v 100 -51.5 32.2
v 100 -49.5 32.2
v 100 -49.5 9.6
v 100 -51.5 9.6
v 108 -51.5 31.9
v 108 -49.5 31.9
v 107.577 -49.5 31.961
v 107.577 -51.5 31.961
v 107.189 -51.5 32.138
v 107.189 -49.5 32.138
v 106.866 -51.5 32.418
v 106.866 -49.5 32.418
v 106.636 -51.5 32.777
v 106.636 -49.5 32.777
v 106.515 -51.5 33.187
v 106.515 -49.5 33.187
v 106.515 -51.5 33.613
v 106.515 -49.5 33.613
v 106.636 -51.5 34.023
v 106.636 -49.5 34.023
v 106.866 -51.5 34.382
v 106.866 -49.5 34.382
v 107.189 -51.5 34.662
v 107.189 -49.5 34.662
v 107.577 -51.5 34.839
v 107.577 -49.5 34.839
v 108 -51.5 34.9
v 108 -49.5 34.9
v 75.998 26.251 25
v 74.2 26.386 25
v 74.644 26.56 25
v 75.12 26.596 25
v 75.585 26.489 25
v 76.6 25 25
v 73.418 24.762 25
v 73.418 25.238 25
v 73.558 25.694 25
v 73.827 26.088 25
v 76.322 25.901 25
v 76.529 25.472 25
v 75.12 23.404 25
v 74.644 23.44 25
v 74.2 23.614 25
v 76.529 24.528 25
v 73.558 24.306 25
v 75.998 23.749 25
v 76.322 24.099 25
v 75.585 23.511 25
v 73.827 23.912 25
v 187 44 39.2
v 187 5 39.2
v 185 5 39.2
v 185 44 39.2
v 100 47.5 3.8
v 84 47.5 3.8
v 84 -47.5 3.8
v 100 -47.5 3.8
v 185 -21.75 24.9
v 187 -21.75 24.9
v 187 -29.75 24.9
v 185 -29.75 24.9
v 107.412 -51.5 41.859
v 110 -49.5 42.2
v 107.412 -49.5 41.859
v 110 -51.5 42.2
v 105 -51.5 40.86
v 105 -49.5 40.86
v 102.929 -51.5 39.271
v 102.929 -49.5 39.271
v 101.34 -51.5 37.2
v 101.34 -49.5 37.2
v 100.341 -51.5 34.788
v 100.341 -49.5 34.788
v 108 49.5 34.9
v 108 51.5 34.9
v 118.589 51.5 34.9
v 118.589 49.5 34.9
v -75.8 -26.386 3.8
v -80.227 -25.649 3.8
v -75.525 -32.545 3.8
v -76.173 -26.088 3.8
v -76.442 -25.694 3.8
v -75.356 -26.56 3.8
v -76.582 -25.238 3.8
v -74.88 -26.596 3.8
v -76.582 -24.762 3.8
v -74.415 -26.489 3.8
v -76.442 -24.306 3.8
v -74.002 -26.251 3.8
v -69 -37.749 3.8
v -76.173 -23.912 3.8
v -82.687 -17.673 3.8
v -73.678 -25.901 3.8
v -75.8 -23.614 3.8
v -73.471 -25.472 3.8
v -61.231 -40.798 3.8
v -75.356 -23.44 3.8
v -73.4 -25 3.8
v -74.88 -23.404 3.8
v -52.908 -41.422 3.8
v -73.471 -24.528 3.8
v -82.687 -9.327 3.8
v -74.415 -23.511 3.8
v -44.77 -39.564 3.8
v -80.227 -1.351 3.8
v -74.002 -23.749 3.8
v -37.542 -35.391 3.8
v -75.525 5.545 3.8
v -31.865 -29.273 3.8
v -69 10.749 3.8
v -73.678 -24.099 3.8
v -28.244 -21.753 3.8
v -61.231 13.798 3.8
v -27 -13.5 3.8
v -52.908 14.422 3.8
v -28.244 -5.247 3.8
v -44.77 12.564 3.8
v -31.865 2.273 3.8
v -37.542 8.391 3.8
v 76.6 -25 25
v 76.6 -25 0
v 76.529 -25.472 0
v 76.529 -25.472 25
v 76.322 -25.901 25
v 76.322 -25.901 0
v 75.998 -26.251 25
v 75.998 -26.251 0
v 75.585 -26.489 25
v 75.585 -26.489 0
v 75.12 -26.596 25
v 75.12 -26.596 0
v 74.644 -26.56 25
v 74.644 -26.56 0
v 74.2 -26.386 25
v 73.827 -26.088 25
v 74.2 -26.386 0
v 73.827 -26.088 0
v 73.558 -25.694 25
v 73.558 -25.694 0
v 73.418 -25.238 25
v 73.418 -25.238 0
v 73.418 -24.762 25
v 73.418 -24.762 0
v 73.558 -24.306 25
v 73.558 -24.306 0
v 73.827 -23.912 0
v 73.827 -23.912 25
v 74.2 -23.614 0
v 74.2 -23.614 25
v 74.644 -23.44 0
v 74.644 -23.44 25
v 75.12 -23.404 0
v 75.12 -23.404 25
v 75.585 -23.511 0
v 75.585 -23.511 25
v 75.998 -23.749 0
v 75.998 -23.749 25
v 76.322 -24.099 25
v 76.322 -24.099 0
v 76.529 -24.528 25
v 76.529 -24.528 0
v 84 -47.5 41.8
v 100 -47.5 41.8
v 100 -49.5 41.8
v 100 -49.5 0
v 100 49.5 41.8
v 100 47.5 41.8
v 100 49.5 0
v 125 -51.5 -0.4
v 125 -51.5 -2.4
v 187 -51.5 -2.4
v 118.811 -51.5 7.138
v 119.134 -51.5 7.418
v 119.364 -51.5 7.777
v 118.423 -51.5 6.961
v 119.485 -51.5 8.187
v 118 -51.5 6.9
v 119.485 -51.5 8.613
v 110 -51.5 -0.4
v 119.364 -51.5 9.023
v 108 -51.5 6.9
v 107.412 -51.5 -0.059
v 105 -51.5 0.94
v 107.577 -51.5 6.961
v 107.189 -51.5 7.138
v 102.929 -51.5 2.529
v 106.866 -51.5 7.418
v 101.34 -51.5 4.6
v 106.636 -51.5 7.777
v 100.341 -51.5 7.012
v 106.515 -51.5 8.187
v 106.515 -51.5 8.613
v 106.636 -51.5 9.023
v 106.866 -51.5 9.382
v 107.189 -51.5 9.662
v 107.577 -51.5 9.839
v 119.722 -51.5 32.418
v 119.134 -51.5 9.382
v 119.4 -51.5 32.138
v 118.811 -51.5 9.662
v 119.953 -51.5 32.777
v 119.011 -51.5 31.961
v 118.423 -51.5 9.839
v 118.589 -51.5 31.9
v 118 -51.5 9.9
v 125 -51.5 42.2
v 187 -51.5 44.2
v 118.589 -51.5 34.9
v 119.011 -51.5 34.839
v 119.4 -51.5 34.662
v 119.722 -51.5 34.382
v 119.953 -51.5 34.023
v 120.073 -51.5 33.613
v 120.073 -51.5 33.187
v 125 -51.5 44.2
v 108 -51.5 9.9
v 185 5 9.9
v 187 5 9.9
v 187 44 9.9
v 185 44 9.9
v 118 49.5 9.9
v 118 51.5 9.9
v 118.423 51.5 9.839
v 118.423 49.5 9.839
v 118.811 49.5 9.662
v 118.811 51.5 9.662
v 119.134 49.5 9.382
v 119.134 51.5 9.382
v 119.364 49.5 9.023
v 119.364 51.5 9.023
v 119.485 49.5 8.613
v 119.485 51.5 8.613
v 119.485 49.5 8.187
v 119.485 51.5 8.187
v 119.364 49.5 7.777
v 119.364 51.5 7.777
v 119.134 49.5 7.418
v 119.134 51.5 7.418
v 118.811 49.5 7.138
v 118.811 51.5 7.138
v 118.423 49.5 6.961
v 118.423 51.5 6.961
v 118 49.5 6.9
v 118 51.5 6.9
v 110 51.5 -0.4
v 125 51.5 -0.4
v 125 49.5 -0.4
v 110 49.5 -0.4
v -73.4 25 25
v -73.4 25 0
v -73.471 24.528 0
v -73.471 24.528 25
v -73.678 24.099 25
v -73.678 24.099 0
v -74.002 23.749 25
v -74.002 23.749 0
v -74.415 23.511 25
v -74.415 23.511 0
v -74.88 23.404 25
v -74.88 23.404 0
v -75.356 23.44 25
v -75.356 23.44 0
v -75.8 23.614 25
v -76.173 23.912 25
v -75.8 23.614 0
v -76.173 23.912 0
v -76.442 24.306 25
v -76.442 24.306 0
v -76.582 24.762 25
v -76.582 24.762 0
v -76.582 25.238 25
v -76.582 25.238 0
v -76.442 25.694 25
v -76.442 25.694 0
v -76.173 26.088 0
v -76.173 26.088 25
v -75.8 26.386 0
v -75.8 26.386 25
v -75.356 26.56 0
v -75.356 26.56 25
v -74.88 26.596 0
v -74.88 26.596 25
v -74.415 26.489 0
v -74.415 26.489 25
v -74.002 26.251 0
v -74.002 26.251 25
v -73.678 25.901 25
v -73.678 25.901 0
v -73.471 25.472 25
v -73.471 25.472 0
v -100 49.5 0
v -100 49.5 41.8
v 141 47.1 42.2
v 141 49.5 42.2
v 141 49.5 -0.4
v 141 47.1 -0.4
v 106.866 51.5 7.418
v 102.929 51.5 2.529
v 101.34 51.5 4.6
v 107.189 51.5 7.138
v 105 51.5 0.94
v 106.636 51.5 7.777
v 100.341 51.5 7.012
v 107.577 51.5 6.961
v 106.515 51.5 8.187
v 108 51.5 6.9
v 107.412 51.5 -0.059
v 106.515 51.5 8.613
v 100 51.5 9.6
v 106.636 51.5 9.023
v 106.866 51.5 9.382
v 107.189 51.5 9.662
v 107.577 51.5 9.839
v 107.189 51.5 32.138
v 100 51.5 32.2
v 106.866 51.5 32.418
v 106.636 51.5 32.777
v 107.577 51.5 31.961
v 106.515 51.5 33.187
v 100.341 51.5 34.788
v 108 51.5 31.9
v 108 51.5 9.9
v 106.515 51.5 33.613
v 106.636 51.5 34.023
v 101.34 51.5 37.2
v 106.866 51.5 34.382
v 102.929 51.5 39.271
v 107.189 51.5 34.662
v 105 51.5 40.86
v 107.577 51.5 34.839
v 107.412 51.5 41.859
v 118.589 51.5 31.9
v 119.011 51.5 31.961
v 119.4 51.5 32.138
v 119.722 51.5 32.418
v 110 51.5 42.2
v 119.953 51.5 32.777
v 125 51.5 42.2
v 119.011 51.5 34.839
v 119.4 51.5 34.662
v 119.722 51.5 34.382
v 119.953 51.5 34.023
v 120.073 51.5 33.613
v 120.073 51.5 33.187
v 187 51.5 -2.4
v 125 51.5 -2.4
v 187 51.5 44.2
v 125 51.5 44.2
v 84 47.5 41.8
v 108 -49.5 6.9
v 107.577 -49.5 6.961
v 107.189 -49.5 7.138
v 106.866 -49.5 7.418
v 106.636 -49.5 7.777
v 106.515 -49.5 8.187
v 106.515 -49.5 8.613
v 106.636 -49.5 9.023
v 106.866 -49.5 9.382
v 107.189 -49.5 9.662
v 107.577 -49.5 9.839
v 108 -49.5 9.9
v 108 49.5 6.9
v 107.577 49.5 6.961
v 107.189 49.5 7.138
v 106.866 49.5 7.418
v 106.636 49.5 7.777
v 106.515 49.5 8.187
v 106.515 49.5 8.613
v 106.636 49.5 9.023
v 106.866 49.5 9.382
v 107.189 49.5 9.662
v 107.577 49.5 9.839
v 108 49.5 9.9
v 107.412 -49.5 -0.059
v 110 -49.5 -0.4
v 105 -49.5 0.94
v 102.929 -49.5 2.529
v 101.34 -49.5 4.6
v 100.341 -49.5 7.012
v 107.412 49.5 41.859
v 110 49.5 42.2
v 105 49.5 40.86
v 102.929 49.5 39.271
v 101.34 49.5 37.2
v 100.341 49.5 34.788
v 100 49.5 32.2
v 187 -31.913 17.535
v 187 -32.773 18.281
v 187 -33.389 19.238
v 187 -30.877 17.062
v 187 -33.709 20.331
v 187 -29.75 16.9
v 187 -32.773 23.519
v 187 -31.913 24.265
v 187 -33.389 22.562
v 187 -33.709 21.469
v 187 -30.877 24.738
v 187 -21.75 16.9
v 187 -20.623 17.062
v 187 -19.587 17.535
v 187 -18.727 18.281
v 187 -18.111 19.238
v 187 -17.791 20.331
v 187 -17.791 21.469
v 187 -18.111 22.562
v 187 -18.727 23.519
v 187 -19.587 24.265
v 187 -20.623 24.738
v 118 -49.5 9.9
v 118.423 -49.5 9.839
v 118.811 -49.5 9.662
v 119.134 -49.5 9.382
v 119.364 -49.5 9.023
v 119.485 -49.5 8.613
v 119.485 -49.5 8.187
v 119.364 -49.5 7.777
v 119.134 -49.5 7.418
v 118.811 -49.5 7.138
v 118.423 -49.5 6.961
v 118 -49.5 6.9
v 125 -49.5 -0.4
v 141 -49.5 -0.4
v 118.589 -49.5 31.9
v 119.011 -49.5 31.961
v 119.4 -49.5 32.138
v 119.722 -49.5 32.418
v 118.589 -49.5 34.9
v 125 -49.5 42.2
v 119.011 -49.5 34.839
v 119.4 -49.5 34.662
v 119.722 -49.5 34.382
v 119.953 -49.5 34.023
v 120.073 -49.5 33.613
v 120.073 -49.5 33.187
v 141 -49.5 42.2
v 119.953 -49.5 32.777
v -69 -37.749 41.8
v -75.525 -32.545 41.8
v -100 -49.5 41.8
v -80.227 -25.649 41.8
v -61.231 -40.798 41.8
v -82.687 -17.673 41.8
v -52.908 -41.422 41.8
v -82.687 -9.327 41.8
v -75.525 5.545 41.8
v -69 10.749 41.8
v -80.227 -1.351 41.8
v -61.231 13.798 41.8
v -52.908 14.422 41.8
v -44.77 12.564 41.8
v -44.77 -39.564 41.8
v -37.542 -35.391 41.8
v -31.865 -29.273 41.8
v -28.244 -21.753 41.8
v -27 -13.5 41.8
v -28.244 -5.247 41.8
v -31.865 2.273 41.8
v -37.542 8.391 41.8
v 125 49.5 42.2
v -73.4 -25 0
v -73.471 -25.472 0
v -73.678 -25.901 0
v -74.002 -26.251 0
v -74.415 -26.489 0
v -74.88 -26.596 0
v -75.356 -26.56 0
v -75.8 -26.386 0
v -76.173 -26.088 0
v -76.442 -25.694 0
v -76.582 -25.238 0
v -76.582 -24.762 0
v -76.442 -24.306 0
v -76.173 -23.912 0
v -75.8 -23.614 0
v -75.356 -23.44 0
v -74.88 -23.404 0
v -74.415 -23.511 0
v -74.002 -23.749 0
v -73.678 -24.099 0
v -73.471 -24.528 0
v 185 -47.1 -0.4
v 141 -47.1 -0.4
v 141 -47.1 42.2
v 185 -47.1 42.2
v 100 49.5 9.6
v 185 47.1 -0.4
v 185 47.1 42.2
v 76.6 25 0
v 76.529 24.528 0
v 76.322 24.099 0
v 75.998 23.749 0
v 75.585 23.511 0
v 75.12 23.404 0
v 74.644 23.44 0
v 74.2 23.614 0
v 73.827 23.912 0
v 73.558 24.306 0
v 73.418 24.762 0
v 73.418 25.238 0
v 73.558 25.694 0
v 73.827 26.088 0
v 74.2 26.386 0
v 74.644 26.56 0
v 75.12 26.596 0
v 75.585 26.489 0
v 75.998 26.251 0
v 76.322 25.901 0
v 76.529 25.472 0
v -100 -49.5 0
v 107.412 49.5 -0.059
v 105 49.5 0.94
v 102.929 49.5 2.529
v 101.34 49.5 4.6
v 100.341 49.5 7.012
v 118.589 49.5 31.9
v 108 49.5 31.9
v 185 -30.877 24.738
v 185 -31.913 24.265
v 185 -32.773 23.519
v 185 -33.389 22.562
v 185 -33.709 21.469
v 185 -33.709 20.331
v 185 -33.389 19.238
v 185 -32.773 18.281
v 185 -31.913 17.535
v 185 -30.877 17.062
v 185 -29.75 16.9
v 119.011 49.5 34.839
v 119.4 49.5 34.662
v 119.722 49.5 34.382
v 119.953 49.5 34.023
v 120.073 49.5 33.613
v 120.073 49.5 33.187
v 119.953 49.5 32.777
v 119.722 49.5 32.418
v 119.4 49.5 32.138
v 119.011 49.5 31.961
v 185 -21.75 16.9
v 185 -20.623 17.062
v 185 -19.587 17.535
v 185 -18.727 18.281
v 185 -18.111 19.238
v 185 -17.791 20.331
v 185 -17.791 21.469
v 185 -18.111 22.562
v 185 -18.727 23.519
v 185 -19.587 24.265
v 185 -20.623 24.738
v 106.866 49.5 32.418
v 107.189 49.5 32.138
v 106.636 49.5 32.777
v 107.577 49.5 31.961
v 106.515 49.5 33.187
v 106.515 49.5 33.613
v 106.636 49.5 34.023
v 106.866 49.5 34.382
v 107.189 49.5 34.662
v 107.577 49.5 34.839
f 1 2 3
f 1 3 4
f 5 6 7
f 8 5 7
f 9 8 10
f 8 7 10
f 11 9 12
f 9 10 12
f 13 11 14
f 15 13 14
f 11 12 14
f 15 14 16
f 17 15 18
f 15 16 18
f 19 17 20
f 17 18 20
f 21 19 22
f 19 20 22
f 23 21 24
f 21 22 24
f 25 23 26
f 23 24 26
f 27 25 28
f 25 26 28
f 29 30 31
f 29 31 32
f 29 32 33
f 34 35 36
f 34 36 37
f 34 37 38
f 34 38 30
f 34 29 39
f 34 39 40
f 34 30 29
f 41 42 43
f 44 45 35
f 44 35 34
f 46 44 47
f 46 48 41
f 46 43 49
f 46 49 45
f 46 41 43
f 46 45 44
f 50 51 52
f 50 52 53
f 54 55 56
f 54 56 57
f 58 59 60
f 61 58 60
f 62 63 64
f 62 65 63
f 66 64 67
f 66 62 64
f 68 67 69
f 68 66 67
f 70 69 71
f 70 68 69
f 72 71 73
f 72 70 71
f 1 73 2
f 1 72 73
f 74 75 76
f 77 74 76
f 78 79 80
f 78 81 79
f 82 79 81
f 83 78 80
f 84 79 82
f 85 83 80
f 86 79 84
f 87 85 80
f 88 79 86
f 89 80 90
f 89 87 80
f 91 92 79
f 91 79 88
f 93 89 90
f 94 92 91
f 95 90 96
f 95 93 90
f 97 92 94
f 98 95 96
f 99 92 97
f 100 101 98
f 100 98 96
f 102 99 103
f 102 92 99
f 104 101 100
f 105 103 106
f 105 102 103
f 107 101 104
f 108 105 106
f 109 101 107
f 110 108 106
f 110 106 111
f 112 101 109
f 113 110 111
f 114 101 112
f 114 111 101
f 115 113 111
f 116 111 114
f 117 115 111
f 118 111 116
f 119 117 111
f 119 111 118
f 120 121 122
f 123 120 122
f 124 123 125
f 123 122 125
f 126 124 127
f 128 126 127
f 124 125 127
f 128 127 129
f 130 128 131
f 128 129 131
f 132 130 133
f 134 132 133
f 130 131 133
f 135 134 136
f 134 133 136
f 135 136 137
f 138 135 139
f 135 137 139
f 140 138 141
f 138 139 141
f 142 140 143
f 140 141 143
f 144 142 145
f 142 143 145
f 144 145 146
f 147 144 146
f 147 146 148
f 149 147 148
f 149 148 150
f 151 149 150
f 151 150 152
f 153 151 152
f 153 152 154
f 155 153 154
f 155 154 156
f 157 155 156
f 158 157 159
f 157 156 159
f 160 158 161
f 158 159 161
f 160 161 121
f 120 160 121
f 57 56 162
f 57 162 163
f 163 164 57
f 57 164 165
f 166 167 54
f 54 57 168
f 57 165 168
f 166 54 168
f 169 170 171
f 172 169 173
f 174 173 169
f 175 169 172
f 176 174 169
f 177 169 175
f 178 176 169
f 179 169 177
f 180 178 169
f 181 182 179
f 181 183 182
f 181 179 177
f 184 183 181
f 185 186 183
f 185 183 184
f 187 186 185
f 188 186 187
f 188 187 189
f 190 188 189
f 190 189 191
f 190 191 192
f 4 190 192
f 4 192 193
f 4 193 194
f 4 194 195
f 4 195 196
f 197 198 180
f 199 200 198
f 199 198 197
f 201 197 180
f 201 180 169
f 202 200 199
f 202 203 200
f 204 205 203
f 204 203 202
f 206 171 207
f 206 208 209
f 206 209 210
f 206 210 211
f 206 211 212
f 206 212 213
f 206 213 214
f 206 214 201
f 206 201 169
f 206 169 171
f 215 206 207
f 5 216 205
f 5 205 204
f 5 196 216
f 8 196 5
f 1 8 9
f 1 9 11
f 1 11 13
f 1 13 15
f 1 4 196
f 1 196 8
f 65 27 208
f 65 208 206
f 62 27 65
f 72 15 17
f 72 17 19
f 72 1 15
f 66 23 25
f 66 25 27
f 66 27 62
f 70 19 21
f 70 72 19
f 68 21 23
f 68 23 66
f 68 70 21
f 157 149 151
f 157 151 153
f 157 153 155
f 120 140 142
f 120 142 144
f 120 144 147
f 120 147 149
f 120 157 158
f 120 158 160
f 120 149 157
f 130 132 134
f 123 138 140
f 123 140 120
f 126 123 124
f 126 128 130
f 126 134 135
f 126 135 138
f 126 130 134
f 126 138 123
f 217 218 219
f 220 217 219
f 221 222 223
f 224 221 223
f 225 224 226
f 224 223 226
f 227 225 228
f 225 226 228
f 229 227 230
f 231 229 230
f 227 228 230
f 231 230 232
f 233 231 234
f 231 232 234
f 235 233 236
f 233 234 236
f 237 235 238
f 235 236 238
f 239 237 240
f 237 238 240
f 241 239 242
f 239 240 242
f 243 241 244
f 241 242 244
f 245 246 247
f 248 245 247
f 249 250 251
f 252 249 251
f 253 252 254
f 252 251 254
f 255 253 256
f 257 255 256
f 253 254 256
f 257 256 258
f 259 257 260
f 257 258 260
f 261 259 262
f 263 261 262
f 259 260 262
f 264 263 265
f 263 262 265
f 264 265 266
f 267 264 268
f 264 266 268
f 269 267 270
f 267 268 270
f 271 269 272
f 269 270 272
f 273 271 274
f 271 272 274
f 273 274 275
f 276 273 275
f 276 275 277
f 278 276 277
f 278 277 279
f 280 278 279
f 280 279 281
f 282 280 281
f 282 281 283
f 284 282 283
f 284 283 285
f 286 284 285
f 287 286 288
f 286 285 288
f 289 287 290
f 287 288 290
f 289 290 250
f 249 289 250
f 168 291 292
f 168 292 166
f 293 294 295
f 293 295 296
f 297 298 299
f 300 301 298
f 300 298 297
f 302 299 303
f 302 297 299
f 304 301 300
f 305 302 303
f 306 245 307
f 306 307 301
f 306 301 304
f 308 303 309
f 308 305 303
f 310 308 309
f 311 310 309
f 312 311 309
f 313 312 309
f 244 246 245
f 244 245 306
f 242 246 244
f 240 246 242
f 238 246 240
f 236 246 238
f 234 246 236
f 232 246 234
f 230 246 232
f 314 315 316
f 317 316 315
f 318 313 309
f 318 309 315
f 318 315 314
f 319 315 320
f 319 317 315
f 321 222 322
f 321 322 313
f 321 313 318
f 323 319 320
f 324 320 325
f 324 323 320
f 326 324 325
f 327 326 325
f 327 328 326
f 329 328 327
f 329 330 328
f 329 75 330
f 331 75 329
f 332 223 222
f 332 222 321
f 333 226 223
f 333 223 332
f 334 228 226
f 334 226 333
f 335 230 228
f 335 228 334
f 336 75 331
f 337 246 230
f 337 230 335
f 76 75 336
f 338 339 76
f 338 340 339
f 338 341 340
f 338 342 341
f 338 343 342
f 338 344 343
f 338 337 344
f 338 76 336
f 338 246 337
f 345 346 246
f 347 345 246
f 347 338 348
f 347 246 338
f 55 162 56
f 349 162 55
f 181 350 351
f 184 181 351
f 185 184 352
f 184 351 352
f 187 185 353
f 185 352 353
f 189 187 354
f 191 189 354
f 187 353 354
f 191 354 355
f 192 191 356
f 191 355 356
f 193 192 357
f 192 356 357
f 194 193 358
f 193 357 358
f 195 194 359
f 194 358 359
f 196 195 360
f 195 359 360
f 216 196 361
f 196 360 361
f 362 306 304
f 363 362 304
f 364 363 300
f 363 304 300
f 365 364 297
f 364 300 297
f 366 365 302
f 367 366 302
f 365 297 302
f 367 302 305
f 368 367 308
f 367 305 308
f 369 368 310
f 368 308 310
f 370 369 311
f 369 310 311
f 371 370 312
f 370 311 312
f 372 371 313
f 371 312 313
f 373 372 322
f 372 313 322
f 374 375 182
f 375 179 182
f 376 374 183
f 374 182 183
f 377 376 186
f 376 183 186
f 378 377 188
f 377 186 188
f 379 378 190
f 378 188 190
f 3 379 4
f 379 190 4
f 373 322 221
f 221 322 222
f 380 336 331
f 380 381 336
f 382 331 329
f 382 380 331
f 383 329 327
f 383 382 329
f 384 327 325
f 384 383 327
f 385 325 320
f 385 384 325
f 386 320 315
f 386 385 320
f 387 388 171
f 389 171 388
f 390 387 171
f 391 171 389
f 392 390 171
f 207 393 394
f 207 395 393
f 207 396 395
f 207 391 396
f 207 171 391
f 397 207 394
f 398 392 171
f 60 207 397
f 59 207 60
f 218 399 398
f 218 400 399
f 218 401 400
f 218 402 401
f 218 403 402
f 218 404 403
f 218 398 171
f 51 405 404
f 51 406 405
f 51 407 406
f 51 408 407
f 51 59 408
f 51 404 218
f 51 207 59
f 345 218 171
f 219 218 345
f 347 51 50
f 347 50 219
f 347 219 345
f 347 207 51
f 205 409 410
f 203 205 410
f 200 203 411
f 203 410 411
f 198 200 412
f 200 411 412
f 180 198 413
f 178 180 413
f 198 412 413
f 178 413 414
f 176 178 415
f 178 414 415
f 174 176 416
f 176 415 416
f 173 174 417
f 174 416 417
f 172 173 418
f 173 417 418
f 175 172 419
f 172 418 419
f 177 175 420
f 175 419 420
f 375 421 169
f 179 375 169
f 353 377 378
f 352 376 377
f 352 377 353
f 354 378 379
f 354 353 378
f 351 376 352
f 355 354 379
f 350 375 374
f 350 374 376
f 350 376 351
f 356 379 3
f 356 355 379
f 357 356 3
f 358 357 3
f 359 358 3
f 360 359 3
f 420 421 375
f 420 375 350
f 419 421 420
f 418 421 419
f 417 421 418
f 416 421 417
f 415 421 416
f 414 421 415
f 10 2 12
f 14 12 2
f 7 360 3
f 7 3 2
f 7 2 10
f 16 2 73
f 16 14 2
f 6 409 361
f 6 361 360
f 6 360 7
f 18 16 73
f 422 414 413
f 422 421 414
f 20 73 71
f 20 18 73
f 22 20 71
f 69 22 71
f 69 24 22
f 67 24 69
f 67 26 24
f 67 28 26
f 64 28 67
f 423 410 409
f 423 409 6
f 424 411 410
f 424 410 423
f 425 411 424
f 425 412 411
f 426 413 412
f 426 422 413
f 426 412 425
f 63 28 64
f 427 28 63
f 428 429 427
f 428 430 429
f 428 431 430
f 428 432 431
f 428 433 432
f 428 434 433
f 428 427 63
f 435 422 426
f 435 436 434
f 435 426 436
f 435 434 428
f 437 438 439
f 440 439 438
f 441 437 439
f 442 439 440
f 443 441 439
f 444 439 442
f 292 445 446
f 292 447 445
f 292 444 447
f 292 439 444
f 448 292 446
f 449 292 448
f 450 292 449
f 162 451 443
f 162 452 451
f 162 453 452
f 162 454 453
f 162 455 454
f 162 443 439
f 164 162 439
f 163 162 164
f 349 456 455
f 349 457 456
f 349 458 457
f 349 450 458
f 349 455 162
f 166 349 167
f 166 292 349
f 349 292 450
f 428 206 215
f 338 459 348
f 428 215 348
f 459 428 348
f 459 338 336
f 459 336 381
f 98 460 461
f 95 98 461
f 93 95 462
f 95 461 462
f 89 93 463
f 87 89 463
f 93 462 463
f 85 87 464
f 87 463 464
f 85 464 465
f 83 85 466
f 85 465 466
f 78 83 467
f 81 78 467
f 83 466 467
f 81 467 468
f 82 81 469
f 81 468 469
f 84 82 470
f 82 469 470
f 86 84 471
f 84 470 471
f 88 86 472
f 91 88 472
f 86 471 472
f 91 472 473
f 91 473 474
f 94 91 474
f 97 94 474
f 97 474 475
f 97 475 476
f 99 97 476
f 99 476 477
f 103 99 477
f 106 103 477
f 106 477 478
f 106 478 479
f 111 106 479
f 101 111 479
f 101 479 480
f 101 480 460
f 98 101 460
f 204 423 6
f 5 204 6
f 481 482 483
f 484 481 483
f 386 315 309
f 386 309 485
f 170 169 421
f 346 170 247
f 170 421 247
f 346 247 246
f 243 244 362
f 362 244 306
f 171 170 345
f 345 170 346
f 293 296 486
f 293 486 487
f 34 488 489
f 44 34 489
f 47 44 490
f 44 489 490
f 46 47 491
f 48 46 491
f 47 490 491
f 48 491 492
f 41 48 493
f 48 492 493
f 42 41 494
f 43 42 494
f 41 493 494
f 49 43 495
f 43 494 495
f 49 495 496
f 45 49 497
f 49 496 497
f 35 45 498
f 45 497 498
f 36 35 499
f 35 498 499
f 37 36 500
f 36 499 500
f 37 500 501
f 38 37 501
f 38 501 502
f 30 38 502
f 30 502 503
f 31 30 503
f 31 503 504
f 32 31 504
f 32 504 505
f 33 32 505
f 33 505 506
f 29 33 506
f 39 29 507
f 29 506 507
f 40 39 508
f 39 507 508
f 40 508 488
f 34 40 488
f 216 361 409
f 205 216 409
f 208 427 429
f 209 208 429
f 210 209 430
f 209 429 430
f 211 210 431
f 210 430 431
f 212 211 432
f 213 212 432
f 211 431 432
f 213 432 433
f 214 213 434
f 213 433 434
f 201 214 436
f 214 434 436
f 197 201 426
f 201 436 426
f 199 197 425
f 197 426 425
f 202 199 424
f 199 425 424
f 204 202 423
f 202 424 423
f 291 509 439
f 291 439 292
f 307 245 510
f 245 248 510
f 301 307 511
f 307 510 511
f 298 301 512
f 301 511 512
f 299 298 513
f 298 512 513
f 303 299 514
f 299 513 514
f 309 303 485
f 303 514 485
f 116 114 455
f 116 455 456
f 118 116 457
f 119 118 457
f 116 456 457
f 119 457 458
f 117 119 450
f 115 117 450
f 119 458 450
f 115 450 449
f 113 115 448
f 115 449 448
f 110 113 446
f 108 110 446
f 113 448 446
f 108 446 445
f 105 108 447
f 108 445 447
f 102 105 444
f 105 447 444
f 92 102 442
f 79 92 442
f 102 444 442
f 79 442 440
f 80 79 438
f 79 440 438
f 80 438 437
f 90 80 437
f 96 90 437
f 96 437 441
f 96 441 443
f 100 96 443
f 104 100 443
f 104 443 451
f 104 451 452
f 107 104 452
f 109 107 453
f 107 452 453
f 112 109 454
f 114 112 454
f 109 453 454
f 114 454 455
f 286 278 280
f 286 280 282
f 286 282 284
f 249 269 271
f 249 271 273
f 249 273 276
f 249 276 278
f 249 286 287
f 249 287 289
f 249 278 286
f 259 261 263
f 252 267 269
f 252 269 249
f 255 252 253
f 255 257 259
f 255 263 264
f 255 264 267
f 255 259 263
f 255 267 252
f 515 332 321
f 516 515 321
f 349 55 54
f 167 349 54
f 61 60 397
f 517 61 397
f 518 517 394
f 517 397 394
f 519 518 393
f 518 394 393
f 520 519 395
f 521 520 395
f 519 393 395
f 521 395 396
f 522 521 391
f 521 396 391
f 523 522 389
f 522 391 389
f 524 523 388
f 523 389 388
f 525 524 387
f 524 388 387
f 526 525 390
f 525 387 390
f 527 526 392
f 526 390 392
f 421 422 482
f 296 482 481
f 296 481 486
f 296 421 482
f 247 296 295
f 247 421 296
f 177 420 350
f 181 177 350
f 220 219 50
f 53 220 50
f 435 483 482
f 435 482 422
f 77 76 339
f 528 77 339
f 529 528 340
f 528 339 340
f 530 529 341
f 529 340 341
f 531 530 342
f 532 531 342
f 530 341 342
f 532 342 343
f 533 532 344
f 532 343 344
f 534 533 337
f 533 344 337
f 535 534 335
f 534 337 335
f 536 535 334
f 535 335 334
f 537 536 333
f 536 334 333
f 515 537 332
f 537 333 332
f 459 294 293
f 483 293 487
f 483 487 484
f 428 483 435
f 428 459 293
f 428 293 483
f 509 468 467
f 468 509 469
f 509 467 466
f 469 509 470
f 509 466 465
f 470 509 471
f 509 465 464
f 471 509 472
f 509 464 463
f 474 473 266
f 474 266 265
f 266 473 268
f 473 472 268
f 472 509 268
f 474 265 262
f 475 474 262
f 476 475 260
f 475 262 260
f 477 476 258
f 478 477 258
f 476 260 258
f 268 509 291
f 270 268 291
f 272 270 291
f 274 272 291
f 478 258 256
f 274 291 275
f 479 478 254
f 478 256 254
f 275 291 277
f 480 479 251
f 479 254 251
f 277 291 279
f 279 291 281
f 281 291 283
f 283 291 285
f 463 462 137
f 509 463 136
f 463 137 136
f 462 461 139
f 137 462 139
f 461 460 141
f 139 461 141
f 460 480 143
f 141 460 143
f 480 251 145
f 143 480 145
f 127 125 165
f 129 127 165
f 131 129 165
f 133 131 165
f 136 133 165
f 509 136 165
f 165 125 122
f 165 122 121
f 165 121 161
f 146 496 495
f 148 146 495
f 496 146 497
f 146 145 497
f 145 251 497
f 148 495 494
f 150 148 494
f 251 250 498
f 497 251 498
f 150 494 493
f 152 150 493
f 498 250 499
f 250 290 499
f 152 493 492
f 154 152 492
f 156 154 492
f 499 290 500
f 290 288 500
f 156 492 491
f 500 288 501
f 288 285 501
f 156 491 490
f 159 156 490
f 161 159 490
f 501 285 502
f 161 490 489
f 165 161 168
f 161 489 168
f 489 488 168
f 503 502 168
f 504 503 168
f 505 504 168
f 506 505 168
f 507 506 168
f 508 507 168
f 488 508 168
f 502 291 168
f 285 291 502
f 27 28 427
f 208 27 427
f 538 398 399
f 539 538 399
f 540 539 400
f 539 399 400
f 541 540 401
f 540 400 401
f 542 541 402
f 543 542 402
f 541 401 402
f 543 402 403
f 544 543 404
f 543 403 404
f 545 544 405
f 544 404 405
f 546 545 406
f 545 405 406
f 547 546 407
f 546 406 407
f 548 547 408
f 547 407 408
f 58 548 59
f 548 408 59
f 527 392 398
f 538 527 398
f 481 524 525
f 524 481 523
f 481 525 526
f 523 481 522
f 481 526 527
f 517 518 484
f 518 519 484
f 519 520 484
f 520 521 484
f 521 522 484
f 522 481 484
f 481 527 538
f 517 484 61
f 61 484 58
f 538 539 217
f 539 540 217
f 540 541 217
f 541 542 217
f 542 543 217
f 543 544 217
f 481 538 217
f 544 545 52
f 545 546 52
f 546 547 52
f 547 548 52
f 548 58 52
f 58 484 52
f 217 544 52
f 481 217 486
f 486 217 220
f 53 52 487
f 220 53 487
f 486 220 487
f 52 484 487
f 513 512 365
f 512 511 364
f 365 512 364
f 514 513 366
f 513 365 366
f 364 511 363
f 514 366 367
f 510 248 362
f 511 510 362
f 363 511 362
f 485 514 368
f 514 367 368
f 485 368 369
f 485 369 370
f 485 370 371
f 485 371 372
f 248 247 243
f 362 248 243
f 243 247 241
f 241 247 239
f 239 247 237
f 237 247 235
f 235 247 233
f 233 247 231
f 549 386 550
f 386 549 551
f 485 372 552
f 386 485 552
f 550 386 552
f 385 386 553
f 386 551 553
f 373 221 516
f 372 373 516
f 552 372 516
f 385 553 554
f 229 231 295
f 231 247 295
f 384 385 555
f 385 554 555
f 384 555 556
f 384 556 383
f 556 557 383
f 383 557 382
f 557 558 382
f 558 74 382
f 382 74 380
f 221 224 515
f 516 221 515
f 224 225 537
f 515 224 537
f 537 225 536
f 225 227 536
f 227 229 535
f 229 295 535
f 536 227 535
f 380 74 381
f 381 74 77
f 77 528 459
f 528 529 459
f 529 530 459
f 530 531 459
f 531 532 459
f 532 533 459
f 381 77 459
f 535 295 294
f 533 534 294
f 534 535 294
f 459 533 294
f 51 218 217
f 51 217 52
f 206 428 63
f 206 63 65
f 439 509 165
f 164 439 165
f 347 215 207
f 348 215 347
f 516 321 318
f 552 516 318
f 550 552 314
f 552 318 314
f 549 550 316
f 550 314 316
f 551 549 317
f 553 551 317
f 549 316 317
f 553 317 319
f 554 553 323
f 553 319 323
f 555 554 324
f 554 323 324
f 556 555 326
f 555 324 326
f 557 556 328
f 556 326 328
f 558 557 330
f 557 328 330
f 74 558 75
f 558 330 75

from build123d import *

# Parameters (mm, degrees)
F0_W      = 200
F0_H      = 99
F1_DEPTH  = 41.8
F2_W      = 16
F2_H      = 95
F2_R      = 28
F3_DEPTH  = 38
F4_R      = 1.6
F5_DEPTH  = 25
F7_W      = 103
F7_H      = 46.6
F7_W_2    = 94.2
F7_H_2    = 42.6
F8_DEPTH  = 60
F9_W      = 103
F9_H      = 46.6
F9_W_2    = 94.2
F9_H_2    = 42.6
F10_DEPTH = 2
F11_W     = 39
F11_H     = 29.3
F12_DEPTH = 2
F13_W     = 99
F13_H     = 42.6
F14_DEPTH = 16
F15_W     = 2
F15_H     = 42.6
F16_DEPTH = 25
F17_R     = 10
F19_DEPTH = 103.001


with BuildPart() as f1:
    # F0 (on Top) → F1 (new body)
    with BuildSketch(Plane.XY):
        Rectangle(F0_W, F0_H)
    extrude(amount=F1_DEPTH)

    # F2 (on face) → F3 (cut)
    with BuildSketch(Plane.XY.offset(41.8)):
        with Locations((92, 0)):
            Rectangle(F2_W, F2_H)
        with Locations((-55, -13.5)):
            Circle(F2_R)
    extrude(amount=-F3_DEPTH, mode=Mode.SUBTRACT)

    # F4 (on face) → F5 (cut)
    with BuildSketch(Plane(origin=(0, 0, 0), x_dir=(1, 0, 0), z_dir=(0, 0, -1))):
        with Locations((-75, 25)):
            Circle(F4_R)
        with Locations((75, 25)):
            Circle(F4_R)
        with Locations((-75, -25)):
            Circle(F4_R)
        with Locations((75, -25)):
            Circle(F4_R)
    extrude(amount=-F5_DEPTH, mode=Mode.SUBTRACT)



with BuildPart() as f8:
    # F7 (on offset) → F8 (new body)
    with BuildSketch(Plane.YZ.offset(125)):
        with Locations((0, 20.9)):
            Rectangle(F7_W, F7_H)
        with Locations((0, 20.9)):
            Rectangle(F7_W_2, F7_H_2, mode=Mode.SUBTRACT)
    extrude(amount=F8_DEPTH)

    # F9 (on face) → F10 (join)
    with BuildSketch(Plane.YZ.offset(185)):
        with Locations((0, 20.9)):
            Rectangle(F9_W, F9_H)
        with Locations((0, 20.9)):
            Rectangle(F9_W_2, F9_H_2, mode=Mode.SUBTRACT)
        with Locations((0, 20.9)):
            Rectangle(F9_W_2, F9_H_2)
    extrude(amount=F10_DEPTH)

    # F11 (on face) → F12 (cut, through all)
    with BuildSketch(Plane.YZ.offset(187)):
        with Locations((24.5, 24.55)):
            Rectangle(F11_W, F11_H)
        with BuildLine():
            ThreePointArc((-29.75, 24.9), (-33.75, 20.9), (-29.75, 16.9))
            Line((-29.75, 16.9), (-21.75, 16.9))
            ThreePointArc((-21.75, 16.9), (-17.75, 20.9), (-21.75, 24.9))
            Line((-21.75, 24.9), (-29.75, 24.9))
        make_face()
    extrude(amount=-F12_DEPTH, mode=Mode.SUBTRACT)

    # F13 (on face) → F14 (cut)
    with BuildSketch(Plane(origin=(125, 0, 0), x_dir=(0, -1, 0), z_dir=(-1, 0, 0))):
        with Locations((0, 20.9)):
            Rectangle(F13_W, F13_H)
    extrude(amount=-F14_DEPTH, mode=Mode.SUBTRACT)


with BuildPart() as f1_1:
    add(f1.part)

    add(f8.part)  # F16 merges F8
    # F15 (on face) → F16 (join)
    with BuildSketch(Plane(origin=(125, 0, 0), x_dir=(0, -1, 0), z_dir=(-1, 0, 0))):
        with Locations((-50.5, 20.9)):
            Rectangle(F15_W, F15_H)
        with Locations((50.5, 20.9)):
            Rectangle(F15_W, F15_H)
    extrude(amount=F16_DEPTH)

    # F17
    f17_edges = [f1_1.edges().sort_by_distance(p)[0] for p in [
        (100, 50.5, 42.2),
        (100, 50.5, -0.4),
        (100, -50.5, 42.2),
        (100, -50.5, -0.4),
    ]]
    fillet(f17_edges, radius=F17_R)

    # F18 (on face) → F19 (cut, through all)
    with BuildSketch(Plane(origin=(0, 51.5, 0), x_dir=(-1, 0, 0), z_dir=(0, 1, 0))):
        with BuildLine():
            ThreePointArc((-118.5887327194, 34.9), (-120.0887327194, 33.4), (-118.5887327194, 31.9))
            Line((-118.5887327194, 31.9), (-108, 31.9))
            ThreePointArc((-108, 31.9), (-106.5, 33.4), (-108, 34.9))
            Line((-108, 34.9), (-118.5887327194, 34.9))
        make_face()
        with BuildLine():
            ThreePointArc((-118, 9.9), (-119.5, 8.4), (-118, 6.9))
            Line((-118, 6.9), (-108, 6.9))
            ThreePointArc((-108, 6.9), (-106.5, 8.4), (-108, 9.9))
            Line((-108, 9.9), (-118, 9.9))
        make_face()
    extrude(amount=-F19_DEPTH, mode=Mode.SUBTRACT)


solid = f1_1.part
